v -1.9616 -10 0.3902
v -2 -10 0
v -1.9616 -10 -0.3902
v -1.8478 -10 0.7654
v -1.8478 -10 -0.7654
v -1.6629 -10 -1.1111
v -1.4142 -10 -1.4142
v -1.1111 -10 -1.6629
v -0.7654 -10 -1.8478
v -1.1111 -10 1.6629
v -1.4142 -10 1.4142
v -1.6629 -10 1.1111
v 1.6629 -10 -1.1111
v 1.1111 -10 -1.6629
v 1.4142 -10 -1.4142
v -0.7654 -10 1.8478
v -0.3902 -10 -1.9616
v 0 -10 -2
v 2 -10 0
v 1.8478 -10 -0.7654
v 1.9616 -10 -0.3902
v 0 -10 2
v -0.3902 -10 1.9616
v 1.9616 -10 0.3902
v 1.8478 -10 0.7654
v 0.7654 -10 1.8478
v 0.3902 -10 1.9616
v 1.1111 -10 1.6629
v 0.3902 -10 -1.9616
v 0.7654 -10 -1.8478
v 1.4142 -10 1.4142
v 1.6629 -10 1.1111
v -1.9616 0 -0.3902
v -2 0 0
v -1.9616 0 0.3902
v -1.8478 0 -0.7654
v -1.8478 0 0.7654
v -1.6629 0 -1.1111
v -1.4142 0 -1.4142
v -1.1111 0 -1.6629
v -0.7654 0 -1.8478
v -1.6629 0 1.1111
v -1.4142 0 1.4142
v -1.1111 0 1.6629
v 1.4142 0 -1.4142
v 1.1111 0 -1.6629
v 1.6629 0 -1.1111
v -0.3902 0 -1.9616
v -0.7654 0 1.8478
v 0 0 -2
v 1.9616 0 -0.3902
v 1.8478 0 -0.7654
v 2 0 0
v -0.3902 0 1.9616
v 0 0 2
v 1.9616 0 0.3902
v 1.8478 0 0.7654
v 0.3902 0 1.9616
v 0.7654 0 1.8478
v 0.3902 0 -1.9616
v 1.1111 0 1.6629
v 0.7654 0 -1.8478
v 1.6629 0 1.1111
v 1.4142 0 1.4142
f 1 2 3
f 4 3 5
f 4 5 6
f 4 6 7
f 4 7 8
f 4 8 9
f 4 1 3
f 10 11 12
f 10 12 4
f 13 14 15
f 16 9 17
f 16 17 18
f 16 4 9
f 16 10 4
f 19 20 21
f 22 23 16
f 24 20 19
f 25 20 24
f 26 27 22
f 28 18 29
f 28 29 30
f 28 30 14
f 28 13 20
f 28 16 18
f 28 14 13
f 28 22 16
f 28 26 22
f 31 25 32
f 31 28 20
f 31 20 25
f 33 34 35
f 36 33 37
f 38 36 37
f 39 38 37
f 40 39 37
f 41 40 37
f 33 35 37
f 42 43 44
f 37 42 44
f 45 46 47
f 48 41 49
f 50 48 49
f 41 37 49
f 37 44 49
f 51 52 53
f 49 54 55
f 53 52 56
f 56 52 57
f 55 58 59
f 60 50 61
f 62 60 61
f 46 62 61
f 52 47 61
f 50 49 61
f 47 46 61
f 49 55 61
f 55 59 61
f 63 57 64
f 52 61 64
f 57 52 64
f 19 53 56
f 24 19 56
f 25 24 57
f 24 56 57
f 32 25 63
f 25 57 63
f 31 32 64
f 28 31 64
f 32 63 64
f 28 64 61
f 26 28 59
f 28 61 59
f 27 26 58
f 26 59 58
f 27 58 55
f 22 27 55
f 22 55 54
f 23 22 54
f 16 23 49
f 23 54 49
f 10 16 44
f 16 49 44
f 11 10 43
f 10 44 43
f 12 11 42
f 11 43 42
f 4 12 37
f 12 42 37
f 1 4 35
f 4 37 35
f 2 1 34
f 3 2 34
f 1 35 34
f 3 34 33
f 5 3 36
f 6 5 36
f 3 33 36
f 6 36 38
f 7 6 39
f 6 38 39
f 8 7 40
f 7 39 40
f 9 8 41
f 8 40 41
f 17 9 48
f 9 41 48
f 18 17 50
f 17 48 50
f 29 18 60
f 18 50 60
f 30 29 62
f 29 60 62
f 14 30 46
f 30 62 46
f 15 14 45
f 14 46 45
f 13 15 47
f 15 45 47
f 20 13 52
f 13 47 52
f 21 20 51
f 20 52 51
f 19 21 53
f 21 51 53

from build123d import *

# Parameters (mm, degrees)
CYLINDER_R          = 2
CYLINDER_DEPTH      = 10
CYLINDER_ROLL_ANGLE = 90


with BuildPart() as part:
    # Cylinder → Cylinder (new body)
    with BuildSketch(Plane.XY):
        Circle(CYLINDER_R)
    extrude(amount=CYLINDER_DEPTH)


with BuildPart() as part_1:
    # Cylinder roll: moved
    add(part.part.rotate(Axis((0, 0, 0), (1, 0, 0)), CYLINDER_ROLL_ANGLE))


with BuildPart() as part_2:
    # Cylinder placement: moved
    add(part_1.part)


solid = part_2.part
